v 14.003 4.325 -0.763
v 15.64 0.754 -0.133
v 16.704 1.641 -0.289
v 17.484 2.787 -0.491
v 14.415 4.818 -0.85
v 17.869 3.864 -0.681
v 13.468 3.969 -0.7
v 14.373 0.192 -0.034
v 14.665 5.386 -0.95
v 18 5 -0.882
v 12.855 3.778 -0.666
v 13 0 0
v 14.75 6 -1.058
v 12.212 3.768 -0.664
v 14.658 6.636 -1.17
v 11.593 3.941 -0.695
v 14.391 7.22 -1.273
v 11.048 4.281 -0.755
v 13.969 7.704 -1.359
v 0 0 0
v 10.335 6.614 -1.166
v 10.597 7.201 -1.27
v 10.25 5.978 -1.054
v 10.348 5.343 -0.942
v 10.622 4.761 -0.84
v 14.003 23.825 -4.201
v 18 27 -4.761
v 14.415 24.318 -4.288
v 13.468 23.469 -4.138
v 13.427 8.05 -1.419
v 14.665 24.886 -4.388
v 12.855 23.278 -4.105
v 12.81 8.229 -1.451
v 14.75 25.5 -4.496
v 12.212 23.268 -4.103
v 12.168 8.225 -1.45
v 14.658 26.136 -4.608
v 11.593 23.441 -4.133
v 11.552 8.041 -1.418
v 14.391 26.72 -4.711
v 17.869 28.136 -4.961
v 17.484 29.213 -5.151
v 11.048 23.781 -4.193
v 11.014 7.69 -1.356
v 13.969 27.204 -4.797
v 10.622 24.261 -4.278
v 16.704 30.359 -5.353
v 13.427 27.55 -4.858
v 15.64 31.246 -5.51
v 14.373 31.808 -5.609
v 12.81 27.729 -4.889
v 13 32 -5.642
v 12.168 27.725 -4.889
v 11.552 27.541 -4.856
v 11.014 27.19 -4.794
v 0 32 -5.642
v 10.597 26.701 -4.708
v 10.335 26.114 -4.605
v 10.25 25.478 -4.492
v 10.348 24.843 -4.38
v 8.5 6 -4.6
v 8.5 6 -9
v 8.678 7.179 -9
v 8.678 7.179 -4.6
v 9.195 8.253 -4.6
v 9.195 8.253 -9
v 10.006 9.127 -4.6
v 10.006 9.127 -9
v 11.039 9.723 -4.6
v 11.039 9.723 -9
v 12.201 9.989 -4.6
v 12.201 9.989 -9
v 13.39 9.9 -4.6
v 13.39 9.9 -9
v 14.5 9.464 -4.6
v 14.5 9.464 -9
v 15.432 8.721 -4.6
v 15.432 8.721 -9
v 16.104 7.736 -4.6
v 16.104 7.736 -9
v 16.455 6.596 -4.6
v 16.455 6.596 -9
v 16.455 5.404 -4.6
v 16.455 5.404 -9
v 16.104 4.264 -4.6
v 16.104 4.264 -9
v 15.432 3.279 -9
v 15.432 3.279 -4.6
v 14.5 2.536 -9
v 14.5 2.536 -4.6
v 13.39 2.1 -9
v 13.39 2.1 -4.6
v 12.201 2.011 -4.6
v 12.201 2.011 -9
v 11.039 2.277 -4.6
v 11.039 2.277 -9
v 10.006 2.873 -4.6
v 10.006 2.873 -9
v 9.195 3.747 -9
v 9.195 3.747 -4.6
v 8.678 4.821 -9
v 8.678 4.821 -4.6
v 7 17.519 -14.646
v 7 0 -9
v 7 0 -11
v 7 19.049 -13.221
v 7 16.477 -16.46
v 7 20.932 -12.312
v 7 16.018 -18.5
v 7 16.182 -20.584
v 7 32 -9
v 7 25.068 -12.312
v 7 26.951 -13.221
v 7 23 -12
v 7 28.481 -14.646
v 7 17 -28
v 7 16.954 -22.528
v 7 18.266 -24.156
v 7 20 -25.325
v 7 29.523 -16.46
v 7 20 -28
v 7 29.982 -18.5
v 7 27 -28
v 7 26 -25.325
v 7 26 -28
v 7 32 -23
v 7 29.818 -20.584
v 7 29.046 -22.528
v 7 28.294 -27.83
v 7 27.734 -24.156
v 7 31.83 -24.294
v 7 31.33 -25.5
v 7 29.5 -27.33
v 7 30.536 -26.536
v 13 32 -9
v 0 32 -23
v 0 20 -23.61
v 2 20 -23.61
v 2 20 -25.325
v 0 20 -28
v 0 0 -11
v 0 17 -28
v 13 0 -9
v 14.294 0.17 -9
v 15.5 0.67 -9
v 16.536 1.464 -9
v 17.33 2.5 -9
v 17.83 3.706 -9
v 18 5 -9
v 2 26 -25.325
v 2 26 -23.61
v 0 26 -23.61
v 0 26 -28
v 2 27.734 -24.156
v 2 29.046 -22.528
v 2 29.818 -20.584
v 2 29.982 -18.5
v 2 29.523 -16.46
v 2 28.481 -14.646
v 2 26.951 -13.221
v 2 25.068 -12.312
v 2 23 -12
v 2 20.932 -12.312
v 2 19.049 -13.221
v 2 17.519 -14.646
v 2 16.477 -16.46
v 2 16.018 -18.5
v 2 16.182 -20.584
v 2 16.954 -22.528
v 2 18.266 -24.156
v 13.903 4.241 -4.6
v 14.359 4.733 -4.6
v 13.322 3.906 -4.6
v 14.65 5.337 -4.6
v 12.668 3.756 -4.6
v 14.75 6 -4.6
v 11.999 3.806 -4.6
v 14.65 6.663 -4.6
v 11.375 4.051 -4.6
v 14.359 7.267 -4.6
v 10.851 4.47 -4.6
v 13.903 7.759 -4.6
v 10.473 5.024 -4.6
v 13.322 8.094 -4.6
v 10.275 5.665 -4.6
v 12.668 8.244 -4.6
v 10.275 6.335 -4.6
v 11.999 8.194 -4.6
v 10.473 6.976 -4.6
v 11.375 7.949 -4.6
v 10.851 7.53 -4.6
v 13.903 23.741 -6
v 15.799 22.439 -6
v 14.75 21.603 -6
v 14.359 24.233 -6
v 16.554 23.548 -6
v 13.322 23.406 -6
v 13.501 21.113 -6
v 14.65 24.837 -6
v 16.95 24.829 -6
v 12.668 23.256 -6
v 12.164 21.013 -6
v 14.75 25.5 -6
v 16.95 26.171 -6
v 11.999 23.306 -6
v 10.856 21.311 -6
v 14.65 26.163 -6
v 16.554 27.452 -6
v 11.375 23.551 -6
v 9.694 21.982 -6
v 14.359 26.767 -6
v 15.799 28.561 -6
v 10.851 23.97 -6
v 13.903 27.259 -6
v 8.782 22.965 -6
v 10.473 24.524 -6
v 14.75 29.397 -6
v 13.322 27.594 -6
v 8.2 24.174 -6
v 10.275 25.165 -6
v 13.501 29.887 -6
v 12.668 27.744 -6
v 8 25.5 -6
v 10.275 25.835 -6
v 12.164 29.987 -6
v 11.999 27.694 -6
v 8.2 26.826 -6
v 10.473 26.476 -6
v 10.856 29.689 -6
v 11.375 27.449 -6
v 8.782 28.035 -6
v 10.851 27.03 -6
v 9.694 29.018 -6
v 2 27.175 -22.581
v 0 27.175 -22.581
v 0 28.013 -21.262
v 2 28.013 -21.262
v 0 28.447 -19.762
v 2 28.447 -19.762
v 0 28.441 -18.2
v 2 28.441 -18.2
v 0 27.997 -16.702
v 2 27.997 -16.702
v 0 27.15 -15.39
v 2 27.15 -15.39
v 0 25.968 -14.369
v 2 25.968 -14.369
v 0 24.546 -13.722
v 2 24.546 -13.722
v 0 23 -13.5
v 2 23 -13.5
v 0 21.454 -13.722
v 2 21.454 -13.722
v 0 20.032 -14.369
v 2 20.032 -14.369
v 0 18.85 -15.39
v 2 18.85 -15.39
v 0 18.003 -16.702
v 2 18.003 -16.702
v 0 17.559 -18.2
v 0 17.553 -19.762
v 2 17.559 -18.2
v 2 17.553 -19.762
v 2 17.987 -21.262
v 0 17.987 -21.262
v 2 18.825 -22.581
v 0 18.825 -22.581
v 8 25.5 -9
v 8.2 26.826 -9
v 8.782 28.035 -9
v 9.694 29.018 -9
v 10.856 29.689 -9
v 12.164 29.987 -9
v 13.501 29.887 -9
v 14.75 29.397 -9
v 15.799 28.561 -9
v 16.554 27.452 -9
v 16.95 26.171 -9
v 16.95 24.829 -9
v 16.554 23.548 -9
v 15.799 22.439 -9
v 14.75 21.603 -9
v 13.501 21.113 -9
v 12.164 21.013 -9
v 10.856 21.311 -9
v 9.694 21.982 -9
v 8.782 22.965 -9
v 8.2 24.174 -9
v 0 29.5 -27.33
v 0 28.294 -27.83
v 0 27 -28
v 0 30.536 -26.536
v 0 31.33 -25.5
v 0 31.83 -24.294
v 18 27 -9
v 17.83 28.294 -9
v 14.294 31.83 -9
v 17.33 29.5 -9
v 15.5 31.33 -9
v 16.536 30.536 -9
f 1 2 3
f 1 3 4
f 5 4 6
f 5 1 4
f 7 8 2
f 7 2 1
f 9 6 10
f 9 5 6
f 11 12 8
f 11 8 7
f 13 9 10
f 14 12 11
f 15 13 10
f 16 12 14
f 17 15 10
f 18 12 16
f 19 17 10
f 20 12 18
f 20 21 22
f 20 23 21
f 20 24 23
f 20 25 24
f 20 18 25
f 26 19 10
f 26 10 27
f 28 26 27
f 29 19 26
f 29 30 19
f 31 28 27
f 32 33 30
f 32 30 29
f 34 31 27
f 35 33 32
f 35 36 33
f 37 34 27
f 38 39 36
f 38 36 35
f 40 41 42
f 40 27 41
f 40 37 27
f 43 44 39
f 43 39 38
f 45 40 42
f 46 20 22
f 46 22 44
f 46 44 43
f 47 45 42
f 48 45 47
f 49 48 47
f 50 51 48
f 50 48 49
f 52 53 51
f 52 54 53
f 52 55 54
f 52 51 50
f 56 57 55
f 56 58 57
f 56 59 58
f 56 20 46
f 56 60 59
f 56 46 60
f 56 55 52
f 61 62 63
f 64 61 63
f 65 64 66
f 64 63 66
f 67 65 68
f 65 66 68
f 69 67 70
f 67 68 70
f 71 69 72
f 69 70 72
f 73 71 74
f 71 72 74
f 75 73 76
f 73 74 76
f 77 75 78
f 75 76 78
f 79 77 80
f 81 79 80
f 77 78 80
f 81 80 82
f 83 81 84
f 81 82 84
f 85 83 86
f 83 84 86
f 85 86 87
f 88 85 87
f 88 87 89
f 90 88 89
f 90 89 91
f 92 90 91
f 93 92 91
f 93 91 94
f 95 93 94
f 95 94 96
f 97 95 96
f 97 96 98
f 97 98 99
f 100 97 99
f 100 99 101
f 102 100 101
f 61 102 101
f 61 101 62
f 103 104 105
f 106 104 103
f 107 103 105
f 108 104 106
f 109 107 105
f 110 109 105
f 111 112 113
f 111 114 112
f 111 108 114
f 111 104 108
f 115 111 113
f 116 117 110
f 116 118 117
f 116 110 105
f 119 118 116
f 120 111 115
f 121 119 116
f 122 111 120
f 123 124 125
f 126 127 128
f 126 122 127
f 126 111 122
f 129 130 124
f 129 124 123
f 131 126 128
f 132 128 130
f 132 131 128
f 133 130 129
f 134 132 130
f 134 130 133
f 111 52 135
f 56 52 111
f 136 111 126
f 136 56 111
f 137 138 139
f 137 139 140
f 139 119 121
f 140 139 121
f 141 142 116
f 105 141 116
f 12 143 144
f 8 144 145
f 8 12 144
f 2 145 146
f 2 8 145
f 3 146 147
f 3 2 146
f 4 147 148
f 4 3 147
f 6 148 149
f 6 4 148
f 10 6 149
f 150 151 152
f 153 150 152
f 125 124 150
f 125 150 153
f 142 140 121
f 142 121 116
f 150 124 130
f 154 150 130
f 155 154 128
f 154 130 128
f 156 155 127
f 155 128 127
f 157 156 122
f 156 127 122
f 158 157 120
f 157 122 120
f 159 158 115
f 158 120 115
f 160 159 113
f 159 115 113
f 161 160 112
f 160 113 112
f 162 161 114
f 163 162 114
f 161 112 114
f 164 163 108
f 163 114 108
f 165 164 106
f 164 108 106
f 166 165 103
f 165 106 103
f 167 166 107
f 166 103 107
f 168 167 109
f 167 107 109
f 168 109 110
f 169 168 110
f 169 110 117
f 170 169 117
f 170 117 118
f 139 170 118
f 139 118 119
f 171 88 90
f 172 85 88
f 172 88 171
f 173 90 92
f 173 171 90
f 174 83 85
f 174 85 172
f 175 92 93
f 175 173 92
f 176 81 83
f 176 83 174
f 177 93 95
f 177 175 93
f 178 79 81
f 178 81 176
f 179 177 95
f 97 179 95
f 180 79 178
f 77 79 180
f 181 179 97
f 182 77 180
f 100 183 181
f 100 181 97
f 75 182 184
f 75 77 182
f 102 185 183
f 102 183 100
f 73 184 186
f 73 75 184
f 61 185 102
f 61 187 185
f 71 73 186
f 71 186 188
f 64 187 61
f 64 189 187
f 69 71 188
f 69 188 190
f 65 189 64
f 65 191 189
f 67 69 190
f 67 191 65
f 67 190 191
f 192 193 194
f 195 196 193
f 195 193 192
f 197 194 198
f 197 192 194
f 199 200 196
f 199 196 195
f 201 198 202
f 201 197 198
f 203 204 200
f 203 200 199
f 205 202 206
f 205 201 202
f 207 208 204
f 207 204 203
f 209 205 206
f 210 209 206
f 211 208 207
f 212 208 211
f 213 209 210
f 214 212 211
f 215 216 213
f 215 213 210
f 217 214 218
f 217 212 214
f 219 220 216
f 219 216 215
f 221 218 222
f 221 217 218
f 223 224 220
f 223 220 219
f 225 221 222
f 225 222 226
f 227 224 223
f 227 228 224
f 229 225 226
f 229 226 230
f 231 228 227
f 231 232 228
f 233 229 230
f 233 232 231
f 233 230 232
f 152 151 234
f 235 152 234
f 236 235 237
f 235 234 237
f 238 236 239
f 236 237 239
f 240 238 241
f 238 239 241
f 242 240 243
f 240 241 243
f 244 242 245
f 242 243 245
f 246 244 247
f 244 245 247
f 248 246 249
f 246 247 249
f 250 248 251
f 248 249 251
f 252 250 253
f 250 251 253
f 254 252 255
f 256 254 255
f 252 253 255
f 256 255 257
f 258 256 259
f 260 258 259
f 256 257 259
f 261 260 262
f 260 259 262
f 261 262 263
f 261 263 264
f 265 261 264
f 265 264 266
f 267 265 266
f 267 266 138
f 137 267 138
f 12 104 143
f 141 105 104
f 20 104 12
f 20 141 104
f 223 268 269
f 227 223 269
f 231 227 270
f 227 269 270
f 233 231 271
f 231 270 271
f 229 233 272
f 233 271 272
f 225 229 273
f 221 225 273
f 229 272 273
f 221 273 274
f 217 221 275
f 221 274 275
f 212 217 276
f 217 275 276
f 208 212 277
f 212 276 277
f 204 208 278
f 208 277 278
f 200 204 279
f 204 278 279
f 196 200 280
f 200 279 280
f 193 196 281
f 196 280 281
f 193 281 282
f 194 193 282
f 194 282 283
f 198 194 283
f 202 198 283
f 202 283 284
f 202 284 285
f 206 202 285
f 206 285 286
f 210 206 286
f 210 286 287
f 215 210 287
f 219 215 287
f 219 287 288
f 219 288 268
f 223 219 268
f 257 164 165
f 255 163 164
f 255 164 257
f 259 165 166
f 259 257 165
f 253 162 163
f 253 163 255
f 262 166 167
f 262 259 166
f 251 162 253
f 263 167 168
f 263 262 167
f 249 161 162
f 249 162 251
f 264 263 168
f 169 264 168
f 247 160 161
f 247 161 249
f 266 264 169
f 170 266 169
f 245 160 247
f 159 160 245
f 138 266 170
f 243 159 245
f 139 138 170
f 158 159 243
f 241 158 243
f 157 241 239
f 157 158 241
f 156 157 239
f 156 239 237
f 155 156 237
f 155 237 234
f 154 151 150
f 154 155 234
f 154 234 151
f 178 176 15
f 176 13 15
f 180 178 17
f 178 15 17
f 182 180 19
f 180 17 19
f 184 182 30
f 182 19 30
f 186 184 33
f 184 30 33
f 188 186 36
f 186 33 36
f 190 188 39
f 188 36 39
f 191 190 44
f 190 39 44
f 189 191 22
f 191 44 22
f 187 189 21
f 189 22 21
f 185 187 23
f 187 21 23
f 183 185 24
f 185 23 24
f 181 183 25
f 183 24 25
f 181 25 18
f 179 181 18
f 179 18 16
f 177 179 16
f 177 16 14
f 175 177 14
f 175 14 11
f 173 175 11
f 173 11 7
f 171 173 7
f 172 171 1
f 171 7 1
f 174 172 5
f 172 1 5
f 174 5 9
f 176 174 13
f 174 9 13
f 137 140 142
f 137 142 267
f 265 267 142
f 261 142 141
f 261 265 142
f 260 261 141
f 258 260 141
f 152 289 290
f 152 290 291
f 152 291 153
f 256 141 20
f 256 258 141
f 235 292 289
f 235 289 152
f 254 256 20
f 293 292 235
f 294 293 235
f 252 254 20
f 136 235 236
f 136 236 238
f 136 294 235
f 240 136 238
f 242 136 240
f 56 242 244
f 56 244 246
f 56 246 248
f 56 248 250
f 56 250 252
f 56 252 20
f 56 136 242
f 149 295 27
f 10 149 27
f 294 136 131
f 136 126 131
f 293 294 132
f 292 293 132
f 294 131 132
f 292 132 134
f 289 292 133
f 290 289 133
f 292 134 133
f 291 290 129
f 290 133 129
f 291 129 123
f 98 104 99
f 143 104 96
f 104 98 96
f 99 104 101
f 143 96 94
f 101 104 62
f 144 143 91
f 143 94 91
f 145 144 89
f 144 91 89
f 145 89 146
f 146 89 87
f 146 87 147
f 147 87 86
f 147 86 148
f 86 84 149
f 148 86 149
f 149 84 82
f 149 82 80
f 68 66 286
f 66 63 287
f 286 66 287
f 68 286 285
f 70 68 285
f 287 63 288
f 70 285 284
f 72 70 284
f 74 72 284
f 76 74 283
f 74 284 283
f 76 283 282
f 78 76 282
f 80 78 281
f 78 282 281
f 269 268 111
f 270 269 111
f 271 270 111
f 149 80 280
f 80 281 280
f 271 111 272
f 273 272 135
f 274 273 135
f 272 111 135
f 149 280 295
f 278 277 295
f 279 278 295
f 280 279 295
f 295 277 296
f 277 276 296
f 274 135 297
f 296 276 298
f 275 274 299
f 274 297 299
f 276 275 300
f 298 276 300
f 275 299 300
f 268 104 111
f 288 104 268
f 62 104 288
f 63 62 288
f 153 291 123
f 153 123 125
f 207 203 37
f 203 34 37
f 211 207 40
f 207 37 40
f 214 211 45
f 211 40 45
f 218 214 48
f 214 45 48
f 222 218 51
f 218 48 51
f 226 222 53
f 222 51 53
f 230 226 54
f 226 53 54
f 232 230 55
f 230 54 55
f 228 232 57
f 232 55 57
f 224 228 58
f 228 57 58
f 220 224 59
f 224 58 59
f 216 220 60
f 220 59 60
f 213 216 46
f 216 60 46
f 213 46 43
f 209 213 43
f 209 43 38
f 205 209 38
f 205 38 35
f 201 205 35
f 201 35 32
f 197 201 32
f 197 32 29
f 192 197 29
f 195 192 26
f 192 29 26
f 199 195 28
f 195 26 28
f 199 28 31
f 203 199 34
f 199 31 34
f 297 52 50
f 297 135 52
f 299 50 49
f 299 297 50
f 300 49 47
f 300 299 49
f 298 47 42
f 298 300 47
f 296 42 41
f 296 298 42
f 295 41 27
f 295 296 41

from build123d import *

# Parameters (mm, degrees)
BOSS_EXTRU_1_DEPTH                                 = 18
ESQUISSE2_W                                        = 11
ESQUISSE2_H                                        = 19
ENL_V_MAT_EXTRU_1_DEPTH                            = 33
CHAMBRAGE_POUR_VIS_T_TE_HEXAGONALE_M41_D           = 4.5
CHAMBRAGE_POUR_VIS_T_TE_HEXAGONALE_M41_CBORE_D     = 8
CHAMBRAGE_POUR_VIS_T_TE_HEXAGONALE_M41_CBORE_DEPTH = 4.4
CHAMBRAGE_POUR_VIS_T_TE_HEXAGONALE_M44_D           = 4.5
CHAMBRAGE_POUR_VIS_T_TE_HEXAGONALE_M44_CBORE_D     = 9
CHAMBRAGE_POUR_VIS_T_TE_HEXAGONALE_M44_CBORE_DEPTH = 3
ESQUISSE9_R                                        = 5.5
ENL_V_MAT_EXTRU_2_DEPTH                            = 8
ESQUISSE10_R                                       = 7
ENL_V_MAT_EXTRU_3_DEPTH                            = 5
ESQUISSE11_W                                       = 9
ESQUISSE11_H                                       = 6
ENL_V_MAT_EXTRU_4_DEPTH                            = 8
CHANFREIN1_SIZE                                    = 17
CONG_1_R                                           = 5
CONG_2_R                                           = 5


with BuildPart() as part:
    # Esquisse1 → Boss.-Extru.1 (new body)
    with BuildSketch(Plane(origin=(0, 0, 0), x_dir=(0, 0, -1), z_dir=(1, 0, 0))):
        Polygon((0, 0), (5.642463383, 32), (28, 32), (28, 0), align=None)
    extrude(amount=BOSS_EXTRU_1_DEPTH)

    # Esquisse2 → Enlèv. mat.-Extru.1 (cut, through all)
    with BuildSketch(Plane(origin=(0, 32, 0), x_dir=(1, 0, 0), z_dir=(0, 1, 0))):
        with Locations((12.5, 18.5)):
            Rectangle(ESQUISSE2_W, ESQUISSE2_H)
    extrude(amount=-ENL_V_MAT_EXTRU_1_DEPTH, mode=Mode.SUBTRACT)

    # Chambrage pour vis à tête hexagonale M41 (through all)
    with Locations(Plane(origin=(0, 0, -9), x_dir=(-1, 0, 0), z_dir=(0, 0, -1))):
        with Locations((-12.5, 6)):
            CounterBoreHole(CHAMBRAGE_POUR_VIS_T_TE_HEXAGONALE_M41_D / 2, CHAMBRAGE_POUR_VIS_T_TE_HEXAGONALE_M41_CBORE_D / 2, CHAMBRAGE_POUR_VIS_T_TE_HEXAGONALE_M41_CBORE_DEPTH)

    # Chambrage pour vis à tête hexagonale M44 (through all)
    with Locations(Plane(origin=(0, 0, -9), x_dir=(-1, 0, 0), z_dir=(0, 0, -1))):
        with Locations((-12.5, 25.5)):
            CounterBoreHole(CHAMBRAGE_POUR_VIS_T_TE_HEXAGONALE_M44_D / 2, CHAMBRAGE_POUR_VIS_T_TE_HEXAGONALE_M44_CBORE_D / 2, CHAMBRAGE_POUR_VIS_T_TE_HEXAGONALE_M44_CBORE_DEPTH)

    # Esquisse9 → Enlèv. mat.-Extru.2 (cut, through all)
    with BuildSketch(Plane(origin=(7, 0, 0), x_dir=(0, 0, -1), z_dir=(1, 0, 0))):
        with Locations((19, 23)):
            Circle(ESQUISSE9_R)
    extrude(amount=-ENL_V_MAT_EXTRU_2_DEPTH, mode=Mode.SUBTRACT)

    # Esquisse10 → Enlèv. mat.-Extru.3 (cut)
    with BuildSketch(Plane(origin=(7, 0, 0), x_dir=(0, 0, -1), z_dir=(1, 0, 0))):
        with Locations((19, 23)):
            Circle(ESQUISSE10_R)
    extrude(amount=-ENL_V_MAT_EXTRU_3_DEPTH, mode=Mode.SUBTRACT)

    # Esquisse11 → Enlèv. mat.-Extru.4 (cut, through all)
    with BuildSketch(Plane(origin=(7, 0, 0), x_dir=(0, 0, -1), z_dir=(1, 0, 0))):
        with Locations((23.5, 23)):
            Rectangle(ESQUISSE11_W, ESQUISSE11_H)
    extrude(amount=-ENL_V_MAT_EXTRU_4_DEPTH, mode=Mode.SUBTRACT)

    # Chanfrein1
    chanfrein1_edges = [part.edges().sort_by_distance(p)[0] for p in [
        (3.5, 0, -28),
    ]]
    chamfer(chanfrein1_edges, length=CHANFREIN1_SIZE)

    # Congé1
    cong_1_edges = [part.edges().sort_by_distance(p)[0] for p in [
        (3.5, 32, -28),
    ]]
    fillet(cong_1_edges, radius=CONG_1_R)

    # Congé2
    cong_2_edges = [part.edges().sort_by_distance(p)[0] for p in [
        (18, 32, -7.321231691),
        (18, 0, -4.5),
    ]]
    fillet(cong_2_edges, radius=CONG_2_R)


solid = part.part
